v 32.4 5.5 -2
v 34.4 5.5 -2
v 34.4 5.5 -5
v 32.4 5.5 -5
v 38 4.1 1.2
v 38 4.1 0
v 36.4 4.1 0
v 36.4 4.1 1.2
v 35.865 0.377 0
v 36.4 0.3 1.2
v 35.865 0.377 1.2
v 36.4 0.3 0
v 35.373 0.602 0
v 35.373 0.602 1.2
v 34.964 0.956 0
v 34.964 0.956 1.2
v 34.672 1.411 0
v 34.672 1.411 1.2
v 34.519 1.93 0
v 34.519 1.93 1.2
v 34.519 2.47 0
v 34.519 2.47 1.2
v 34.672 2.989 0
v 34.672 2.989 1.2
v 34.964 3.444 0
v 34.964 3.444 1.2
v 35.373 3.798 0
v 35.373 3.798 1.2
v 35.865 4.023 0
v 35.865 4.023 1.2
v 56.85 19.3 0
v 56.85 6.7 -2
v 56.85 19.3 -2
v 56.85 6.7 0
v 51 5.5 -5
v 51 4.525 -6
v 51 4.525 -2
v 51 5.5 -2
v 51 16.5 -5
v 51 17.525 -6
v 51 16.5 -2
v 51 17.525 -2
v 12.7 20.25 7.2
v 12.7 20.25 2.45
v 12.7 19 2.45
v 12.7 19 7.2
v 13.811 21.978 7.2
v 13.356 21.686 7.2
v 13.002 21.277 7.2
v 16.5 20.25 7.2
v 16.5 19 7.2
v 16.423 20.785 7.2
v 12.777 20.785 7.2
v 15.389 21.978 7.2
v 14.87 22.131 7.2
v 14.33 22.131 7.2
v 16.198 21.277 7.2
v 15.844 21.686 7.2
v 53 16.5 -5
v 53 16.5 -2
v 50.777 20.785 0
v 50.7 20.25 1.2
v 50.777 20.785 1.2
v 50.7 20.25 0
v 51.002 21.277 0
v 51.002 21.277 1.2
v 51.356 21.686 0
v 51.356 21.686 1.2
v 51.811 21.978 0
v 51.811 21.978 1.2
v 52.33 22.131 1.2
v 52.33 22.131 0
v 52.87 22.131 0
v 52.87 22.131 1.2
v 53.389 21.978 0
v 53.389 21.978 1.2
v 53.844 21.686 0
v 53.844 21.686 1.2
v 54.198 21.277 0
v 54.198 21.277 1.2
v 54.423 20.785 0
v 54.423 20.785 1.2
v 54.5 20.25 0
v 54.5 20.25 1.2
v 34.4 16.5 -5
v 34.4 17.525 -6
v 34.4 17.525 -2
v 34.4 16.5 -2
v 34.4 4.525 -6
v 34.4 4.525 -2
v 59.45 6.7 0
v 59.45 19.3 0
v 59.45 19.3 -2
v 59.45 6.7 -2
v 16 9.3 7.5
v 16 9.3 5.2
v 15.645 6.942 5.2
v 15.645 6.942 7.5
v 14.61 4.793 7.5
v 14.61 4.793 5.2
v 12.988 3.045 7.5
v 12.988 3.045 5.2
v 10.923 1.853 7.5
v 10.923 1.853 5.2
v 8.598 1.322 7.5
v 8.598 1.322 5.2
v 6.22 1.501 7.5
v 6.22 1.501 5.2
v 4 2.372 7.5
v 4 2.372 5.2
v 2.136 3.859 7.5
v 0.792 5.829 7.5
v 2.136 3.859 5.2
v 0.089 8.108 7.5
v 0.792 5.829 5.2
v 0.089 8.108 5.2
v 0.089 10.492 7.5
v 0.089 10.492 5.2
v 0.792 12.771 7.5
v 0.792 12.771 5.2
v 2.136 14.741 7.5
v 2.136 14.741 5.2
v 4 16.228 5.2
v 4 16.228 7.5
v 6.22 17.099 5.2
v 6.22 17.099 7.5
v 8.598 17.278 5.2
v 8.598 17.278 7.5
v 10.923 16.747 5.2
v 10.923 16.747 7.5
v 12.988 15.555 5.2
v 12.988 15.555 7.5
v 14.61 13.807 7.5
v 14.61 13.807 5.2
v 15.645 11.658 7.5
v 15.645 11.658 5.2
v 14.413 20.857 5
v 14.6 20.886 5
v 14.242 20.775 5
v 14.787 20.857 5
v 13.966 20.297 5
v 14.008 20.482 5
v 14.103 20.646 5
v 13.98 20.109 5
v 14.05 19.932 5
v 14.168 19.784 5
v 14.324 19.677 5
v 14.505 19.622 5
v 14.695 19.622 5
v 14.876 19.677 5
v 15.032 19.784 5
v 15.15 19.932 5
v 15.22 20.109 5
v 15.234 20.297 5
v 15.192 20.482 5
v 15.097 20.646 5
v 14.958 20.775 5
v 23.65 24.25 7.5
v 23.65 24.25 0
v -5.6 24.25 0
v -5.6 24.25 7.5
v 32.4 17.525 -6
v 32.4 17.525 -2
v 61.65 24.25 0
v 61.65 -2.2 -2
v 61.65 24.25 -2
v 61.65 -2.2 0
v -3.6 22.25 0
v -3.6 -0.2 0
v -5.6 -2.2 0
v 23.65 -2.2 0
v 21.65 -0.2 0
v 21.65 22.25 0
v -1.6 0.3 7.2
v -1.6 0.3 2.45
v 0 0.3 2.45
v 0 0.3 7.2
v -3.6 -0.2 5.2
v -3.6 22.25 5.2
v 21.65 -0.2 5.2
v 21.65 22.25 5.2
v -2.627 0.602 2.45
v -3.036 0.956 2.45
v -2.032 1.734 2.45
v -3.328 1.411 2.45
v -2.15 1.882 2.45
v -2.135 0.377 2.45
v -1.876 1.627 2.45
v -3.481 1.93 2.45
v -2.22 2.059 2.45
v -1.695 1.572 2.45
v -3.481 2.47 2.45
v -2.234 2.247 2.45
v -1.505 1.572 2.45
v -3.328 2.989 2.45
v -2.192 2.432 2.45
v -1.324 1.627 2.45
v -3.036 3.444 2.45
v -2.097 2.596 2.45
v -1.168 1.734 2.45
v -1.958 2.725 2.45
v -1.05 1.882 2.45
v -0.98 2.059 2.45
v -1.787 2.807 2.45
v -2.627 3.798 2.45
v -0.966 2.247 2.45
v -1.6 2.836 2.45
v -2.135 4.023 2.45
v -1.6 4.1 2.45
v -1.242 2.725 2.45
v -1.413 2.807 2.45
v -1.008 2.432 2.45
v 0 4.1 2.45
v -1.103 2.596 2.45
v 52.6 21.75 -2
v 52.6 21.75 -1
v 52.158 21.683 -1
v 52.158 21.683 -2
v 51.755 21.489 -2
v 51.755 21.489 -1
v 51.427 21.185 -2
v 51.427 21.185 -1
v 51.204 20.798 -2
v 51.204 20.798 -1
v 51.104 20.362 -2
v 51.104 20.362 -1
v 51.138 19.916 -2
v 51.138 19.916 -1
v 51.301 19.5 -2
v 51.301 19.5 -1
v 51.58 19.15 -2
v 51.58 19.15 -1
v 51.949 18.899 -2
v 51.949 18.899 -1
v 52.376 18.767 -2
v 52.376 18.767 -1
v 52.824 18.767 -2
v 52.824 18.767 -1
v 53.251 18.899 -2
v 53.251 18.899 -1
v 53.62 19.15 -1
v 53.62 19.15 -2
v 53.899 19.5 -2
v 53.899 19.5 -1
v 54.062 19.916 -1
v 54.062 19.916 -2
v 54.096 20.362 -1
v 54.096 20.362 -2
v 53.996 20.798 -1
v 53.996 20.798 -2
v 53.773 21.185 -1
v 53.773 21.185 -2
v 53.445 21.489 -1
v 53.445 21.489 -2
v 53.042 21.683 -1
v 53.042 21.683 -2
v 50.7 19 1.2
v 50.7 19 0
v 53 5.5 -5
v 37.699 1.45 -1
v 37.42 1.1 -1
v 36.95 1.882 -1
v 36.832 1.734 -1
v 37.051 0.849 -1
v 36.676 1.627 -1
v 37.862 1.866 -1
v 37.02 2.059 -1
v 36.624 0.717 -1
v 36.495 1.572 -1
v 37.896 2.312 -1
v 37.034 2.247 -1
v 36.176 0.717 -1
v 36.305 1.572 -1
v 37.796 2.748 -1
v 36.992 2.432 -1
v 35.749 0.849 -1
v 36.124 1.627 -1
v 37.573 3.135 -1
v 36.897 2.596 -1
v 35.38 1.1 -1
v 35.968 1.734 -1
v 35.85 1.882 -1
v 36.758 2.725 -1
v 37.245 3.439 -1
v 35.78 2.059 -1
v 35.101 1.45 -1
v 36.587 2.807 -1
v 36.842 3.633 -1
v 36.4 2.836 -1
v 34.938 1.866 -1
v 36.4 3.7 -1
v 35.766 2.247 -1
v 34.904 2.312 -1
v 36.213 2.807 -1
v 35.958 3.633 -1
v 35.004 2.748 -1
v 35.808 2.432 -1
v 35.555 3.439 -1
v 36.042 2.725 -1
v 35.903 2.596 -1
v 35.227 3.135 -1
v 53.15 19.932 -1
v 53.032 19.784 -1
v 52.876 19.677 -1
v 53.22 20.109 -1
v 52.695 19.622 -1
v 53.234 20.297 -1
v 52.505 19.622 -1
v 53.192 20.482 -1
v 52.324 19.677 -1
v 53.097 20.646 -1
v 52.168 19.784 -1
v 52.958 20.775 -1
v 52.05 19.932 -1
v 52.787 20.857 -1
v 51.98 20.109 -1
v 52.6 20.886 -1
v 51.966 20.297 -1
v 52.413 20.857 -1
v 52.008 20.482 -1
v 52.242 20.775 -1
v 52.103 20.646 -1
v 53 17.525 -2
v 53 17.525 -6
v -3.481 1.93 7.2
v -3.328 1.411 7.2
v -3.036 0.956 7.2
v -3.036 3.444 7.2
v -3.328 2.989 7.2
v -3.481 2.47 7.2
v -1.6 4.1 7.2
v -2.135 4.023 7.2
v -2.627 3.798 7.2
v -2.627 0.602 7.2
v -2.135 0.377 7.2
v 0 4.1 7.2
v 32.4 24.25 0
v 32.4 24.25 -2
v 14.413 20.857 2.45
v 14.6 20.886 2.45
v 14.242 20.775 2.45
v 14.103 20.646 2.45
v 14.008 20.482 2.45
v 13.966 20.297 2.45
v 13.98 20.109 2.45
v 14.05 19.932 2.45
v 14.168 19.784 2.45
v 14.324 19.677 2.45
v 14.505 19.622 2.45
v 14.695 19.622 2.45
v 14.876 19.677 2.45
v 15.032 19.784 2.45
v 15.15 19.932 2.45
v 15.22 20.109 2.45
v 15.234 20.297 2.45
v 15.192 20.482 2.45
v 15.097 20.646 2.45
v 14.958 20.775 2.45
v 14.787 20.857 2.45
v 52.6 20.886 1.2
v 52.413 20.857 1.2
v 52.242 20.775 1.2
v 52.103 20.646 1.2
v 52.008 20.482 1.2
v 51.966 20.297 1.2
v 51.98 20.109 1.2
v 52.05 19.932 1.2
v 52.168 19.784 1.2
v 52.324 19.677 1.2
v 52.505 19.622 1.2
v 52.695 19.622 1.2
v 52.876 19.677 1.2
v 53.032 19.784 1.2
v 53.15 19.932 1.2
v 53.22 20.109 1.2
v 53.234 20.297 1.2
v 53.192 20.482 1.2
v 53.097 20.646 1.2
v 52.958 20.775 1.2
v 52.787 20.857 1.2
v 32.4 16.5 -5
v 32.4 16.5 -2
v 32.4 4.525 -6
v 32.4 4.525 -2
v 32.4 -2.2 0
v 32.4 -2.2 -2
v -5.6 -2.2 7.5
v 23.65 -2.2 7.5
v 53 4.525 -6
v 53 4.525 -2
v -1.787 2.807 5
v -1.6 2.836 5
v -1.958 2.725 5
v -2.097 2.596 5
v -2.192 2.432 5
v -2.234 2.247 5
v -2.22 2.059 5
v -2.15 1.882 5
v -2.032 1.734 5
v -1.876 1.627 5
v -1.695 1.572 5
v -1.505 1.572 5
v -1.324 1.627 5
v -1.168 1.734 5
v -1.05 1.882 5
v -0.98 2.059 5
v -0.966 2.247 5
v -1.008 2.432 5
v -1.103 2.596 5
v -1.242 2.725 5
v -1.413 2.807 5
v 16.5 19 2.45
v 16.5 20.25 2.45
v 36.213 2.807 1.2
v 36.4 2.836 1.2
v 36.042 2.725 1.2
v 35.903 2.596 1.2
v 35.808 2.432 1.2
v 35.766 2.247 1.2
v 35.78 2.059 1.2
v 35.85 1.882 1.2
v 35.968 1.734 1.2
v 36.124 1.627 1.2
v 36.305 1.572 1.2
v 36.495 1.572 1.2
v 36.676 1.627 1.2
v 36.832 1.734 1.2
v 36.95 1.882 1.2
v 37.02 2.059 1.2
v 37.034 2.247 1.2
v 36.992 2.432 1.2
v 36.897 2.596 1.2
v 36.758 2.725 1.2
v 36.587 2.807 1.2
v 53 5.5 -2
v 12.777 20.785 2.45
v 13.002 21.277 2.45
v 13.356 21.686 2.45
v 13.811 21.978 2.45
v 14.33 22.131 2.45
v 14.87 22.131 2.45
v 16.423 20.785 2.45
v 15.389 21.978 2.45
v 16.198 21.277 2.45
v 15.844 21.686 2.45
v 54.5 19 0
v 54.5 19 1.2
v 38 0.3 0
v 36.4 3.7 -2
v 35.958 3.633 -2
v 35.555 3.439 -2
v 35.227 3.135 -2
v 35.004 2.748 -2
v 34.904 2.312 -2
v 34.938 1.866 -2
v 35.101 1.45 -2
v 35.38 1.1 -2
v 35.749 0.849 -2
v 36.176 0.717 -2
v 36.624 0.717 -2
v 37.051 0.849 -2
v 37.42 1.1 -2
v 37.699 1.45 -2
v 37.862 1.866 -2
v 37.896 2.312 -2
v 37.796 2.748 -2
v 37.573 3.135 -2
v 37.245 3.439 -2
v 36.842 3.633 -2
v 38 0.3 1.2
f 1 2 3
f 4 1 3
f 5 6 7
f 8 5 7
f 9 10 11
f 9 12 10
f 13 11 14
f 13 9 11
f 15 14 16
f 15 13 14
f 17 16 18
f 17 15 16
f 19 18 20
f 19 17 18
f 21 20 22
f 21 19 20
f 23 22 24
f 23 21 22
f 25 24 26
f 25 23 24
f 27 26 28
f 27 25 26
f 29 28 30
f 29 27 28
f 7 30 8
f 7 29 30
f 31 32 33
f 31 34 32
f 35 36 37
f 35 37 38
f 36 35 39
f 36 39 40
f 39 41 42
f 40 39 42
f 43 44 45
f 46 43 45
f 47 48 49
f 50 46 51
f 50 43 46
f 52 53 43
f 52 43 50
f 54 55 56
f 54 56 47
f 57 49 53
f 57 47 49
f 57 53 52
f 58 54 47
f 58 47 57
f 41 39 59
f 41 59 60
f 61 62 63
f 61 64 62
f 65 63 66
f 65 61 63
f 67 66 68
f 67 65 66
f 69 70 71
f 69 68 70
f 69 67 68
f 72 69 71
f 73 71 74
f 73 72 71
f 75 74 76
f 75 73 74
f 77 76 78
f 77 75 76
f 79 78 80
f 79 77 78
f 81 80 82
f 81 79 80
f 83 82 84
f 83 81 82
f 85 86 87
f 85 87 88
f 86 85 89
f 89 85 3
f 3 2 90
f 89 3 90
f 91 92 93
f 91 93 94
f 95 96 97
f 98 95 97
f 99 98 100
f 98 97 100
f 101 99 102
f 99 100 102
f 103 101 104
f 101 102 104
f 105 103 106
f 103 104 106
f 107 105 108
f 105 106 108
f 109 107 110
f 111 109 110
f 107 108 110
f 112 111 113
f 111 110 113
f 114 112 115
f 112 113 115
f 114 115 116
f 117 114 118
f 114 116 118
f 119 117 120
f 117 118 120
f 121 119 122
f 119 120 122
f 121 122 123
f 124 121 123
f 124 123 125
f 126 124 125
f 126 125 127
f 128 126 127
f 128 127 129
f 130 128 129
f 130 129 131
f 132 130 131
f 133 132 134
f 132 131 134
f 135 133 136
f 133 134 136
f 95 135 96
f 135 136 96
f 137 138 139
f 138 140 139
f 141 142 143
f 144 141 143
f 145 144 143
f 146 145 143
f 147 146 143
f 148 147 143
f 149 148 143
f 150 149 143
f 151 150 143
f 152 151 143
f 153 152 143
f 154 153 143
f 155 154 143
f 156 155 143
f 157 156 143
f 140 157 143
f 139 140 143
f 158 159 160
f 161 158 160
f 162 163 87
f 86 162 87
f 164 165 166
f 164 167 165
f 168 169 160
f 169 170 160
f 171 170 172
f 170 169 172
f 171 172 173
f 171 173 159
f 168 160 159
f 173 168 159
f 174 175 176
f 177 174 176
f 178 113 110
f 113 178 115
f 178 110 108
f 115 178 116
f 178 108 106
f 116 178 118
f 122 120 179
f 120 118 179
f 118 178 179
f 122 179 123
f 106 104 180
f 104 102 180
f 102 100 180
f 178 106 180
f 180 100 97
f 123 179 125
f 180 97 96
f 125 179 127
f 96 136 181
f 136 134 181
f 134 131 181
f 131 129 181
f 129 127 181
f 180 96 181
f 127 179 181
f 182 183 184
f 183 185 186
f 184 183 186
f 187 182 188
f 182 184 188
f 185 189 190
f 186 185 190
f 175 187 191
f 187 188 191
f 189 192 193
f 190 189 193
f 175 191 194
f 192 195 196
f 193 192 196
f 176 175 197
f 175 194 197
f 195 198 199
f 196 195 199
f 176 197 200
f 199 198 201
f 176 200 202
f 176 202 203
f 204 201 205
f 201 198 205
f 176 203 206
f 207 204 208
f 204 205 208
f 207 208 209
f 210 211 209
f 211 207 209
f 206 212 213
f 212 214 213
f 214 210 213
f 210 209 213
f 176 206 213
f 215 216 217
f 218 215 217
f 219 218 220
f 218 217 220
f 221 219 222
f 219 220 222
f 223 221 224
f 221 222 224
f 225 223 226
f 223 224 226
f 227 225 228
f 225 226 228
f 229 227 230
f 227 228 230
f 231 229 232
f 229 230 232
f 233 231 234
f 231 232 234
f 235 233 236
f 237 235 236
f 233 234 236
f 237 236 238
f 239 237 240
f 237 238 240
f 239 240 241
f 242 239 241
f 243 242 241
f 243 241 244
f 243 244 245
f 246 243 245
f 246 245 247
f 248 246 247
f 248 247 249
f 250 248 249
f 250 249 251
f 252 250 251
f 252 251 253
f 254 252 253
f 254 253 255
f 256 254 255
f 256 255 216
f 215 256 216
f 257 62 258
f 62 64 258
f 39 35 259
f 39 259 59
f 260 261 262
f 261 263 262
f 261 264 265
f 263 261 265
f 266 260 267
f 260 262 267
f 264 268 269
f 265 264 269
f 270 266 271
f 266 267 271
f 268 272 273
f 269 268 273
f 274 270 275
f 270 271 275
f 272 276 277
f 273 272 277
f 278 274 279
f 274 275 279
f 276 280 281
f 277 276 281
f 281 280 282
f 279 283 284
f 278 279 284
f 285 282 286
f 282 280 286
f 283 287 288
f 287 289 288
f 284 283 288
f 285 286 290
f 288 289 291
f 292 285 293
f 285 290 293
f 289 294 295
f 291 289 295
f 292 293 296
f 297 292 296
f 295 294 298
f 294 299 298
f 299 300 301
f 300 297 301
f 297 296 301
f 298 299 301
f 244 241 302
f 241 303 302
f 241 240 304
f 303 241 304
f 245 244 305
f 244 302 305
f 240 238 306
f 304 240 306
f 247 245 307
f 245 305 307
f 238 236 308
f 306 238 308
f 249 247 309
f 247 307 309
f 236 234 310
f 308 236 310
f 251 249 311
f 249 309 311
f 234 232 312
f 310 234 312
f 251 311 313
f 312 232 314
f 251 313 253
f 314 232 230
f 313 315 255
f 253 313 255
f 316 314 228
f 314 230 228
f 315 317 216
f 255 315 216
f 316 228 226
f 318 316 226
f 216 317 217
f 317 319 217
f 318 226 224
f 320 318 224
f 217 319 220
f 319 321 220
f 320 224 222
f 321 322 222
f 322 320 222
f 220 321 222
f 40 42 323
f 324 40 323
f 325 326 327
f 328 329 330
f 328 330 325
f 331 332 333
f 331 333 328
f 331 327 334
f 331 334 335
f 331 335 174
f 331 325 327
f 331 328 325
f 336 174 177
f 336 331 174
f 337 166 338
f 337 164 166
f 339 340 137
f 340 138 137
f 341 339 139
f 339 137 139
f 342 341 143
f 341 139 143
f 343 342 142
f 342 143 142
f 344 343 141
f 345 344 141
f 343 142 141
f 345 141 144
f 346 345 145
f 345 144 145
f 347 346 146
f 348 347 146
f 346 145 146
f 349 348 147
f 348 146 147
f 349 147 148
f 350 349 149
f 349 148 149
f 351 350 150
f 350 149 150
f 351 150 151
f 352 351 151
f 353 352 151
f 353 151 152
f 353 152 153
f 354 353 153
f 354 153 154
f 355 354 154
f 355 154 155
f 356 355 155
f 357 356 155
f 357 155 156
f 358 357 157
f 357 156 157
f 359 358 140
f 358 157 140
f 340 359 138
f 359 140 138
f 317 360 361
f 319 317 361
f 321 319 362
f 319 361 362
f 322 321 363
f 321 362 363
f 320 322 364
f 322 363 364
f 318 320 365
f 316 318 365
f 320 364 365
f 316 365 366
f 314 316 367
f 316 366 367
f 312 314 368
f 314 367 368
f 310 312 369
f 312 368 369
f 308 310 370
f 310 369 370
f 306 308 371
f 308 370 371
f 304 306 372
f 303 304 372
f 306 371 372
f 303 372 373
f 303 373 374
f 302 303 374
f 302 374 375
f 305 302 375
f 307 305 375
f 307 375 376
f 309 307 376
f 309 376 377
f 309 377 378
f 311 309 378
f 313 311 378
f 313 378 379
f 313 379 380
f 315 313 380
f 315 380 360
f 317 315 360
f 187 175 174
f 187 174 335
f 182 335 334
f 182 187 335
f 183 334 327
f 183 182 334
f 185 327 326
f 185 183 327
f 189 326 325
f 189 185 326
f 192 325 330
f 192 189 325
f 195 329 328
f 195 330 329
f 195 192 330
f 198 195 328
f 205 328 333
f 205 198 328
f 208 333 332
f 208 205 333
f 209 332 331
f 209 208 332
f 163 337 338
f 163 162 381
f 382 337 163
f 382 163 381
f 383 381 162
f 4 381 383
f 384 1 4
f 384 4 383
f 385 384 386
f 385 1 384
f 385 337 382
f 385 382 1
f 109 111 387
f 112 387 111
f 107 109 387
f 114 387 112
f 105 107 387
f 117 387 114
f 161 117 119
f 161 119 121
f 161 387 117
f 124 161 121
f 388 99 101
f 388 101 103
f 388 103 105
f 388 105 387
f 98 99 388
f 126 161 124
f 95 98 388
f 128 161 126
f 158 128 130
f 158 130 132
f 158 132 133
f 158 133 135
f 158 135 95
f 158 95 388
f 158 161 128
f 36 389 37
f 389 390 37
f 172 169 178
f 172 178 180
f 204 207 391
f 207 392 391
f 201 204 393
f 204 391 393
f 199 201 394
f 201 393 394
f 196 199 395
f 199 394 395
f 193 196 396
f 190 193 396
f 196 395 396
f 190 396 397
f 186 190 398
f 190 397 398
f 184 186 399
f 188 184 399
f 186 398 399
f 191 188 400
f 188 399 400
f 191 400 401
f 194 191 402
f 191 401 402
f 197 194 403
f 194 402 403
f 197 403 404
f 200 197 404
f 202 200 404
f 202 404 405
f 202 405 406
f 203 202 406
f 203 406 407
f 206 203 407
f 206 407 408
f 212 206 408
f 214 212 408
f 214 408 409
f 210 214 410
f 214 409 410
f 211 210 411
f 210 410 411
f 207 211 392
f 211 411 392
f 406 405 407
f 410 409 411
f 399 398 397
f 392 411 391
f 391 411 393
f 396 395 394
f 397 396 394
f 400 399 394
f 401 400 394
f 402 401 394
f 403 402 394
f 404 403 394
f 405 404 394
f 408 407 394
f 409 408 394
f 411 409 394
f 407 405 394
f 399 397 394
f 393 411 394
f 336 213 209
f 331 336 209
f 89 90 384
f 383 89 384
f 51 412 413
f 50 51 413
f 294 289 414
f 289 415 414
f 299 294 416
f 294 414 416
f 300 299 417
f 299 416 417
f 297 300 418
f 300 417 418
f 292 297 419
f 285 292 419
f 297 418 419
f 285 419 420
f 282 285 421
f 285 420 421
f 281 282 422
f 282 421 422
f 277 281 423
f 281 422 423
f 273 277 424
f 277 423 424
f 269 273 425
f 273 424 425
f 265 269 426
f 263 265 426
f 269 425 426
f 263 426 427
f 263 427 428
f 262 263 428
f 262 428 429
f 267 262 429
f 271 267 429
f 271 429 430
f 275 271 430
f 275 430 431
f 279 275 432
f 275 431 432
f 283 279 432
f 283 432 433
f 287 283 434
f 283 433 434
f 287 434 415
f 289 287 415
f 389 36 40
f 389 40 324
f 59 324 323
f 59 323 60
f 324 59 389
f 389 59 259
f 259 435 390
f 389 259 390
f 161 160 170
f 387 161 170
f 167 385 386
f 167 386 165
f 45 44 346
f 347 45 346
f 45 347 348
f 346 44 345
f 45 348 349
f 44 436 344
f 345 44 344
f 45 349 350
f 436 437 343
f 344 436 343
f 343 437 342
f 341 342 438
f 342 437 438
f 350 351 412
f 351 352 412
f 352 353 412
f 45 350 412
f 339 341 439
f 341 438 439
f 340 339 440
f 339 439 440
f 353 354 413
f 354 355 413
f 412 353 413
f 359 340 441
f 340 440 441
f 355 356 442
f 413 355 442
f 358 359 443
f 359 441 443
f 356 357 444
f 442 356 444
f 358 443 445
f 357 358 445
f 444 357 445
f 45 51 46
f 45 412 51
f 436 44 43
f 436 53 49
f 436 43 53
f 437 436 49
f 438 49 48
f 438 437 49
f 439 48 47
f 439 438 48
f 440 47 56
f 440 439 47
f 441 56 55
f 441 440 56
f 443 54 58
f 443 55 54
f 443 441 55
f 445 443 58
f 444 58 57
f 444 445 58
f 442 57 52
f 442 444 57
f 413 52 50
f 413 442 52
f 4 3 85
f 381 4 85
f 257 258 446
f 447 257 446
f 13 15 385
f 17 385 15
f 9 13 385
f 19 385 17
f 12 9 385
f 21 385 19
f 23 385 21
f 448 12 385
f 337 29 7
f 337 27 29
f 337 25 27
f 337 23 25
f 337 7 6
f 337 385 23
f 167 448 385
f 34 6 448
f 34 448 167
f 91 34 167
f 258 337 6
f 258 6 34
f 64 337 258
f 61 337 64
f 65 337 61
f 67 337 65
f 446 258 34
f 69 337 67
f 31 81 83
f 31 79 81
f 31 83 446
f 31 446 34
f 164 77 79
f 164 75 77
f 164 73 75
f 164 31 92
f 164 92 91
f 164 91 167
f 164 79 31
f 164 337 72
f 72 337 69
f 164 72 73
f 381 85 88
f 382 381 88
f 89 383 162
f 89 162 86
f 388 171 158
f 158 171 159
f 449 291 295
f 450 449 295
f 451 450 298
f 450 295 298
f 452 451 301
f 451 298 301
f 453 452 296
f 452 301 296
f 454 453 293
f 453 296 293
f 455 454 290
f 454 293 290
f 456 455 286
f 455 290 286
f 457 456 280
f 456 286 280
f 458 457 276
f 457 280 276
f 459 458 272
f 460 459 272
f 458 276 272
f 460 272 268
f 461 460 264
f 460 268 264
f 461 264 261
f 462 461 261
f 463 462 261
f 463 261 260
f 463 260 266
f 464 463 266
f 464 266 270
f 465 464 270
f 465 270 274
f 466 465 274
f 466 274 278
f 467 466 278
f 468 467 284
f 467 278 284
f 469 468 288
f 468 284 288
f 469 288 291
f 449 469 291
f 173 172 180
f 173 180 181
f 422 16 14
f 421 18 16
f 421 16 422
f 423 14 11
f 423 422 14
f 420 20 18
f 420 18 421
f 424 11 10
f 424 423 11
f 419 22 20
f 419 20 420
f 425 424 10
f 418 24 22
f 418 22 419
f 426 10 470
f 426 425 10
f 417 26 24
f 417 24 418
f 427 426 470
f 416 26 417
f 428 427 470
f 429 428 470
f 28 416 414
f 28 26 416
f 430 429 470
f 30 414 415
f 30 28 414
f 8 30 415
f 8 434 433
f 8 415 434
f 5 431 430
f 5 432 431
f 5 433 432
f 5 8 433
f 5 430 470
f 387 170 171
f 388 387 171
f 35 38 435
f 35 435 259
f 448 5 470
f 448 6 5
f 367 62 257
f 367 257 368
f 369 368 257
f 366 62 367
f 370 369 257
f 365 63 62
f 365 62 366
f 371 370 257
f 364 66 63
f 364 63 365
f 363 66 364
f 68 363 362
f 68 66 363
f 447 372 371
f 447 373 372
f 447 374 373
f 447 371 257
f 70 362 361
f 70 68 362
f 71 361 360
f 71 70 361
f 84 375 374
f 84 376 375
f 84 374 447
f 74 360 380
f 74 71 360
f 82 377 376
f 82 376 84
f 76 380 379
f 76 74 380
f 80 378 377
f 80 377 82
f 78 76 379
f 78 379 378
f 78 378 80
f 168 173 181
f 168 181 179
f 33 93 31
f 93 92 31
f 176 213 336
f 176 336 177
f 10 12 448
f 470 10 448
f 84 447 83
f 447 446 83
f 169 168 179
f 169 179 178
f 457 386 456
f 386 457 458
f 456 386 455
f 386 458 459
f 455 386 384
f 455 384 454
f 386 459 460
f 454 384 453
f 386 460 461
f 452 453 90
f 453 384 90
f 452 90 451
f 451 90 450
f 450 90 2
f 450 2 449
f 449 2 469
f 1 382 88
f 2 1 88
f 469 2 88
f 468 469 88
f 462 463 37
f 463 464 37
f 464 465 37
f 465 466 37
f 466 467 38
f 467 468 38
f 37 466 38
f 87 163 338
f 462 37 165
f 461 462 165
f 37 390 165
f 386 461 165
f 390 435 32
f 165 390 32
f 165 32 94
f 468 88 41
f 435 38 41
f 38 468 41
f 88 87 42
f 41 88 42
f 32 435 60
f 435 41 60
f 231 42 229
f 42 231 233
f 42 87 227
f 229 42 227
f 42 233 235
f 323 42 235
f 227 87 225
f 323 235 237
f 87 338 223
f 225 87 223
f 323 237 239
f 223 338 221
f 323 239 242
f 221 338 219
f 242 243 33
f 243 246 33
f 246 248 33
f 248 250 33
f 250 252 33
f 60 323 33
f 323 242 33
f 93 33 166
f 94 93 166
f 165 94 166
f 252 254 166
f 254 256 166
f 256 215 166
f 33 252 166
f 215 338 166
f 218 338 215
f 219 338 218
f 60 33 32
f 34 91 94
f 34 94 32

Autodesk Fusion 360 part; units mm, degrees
sketch "Sketch3" plane through (0, 0, 0) normal (0, 0, 1) x (1, 0, 0)
  line L0 (0, 0) -> (16.95, 0)
  line L1 (16.95, 0) -> (16.95, 19)
  line L2 (16.95, 19) -> (0, 19)
  line L3 (0, 19) -> (0, 0)
  circle A0 centre (8, 9.3) radius 8
  circle A1 centre (14.6, 20.25) radius 0.8
  circle A2 centre (14.6, 20.25) radius 1.9
  line L4 (16.5, 20.25) -> (12.7, 20.25)
  line L5 (12.7, 20.25) -> (12.7, 19)
  line L6 (12.7, 19) -> (16.5, 19)
  line L7 (16.5, 19) -> (16.5, 20.25)
  circle A3 centre (-1.6, 2.2) radius 0.725
  circle A4 centre (-1.6, 2.2) radius 1.9
  line L8 (0, 4.1) -> (0, 0)
  line L9 (-1.6, 0.3) -> (0, 0.3)
  line L10 (0, 0.3) -> (0, 4.1)
  line L11 (0, 4.1) -> (-1.6, 4.1)
  line L12 (-1.6, 4.1) -> (-1.6, 0.3)
  line L13 (21.45, 19.3) -> (18.85, 19.3)
  line L14 (18.85, 19.3) -> (18.85, 16.7)
  line L15 (18.85, 16.7) -> (21.45, 16.7)
  line L16 (21.45, 16.7) -> (21.45, 19.3)
  line L17 (21.45, 19.3) -> (18.85, 16.7) construction
  line L18 (18.85, 19.3) -> (21.45, 16.7) construction
  line L19 (18.85, 19.3) -> (21.45, 19.3)
  line L20 (21.45, 19.3) -> (21.45, 6.7)
  line L21 (21.45, 6.7) -> (18.85, 6.7)
  line L22 (18.85, 6.7) -> (18.85, 19.3)
  circle A5 centre (52.6, 20.25) radius 1.9
  line L23 (38, 4.1) -> (38, 0)
  line L24 (59.45, 6.7) -> (56.85, 6.7)
  line L25 (50.7, 19) -> (54.5, 19)
  line L26 (59.45, 19.3) -> (56.85, 19.3)
  circle A6 centre (36.4, 2.2) radius 0.725
  line L27 (36.4, 0.3) -> (38, 0.3)
  line L28 (54.5, 19) -> (54.5, 20.25)
  line L29 (56.85, 19.3) -> (59.45, 19.3)
  line L30 (56.85, 6.7) -> (56.85, 19.3)
  line L31 (38, 0.3) -> (38, 4.1)
  circle A7 centre (52.6, 20.25) radius 0.8
  line L32 (36.4, 4.1) -> (36.4, 0.3)
  line L33 (54.95, 0) -> (54.95, 19)
  line L34 (56.85, 19.3) -> (56.85, 16.7)
  line L35 (59.45, 19.3) -> (59.45, 6.7)
  line L36 (59.45, 19.3) -> (56.85, 16.7) construction
  line L37 (54.95, 19) -> (38, 19)
  circle A8 centre (36.4, 2.2) radius 1.9
  line L38 (38, 4.1) -> (36.4, 4.1)
  line L39 (56.85, 19.3) -> (59.45, 16.7) construction
  line L40 (54.5, 20.25) -> (50.7, 20.25)
  line L41 (56.85, 16.7) -> (59.45, 16.7)
  line L42 (38, 0) -> (54.95, 0)
  line L43 (59.45, 16.7) -> (59.45, 19.3)
  circle A9 centre (46, 9.3) radius 8
  line L44 (50.7, 20.25) -> (50.7, 19)
  line L45 (38, 19) -> (38, 0)
  point P0 (8, 9.3)
  point P1 (14.6, 20.25)
  point P2 (-1.6, 2.2)
  point P3 (20.15, 18)
  point P4 (20.15, 18)
  point P5 (38, 0)
  point P6 (52.6, 20.25)
  point P7 (46, 9.3)
  point P8 (36.4, 2.2)
  point P9 (58.15, 18)
  point P10 (58.15, 18)
  dimension "d8" = 16.95
  dimension "d9" = 19
  dimension "d10" = 9.3
  dimension "d11" = 8
  dimension "d12" = 16
  dimension "d13" = 10.95
  dimension "d14" = 14.6
  dimension "d15" = 1.6
  dimension "d16" = 3.8
  dimension "d17" = 7.1
  dimension "d18" = 16.2
  dimension "d19" = 1.45
  dimension "d20" = 3.8
  dimension "d21" = 5.55
  dimension "d22" = 2.25
  dimension "d23" = 2.6
  dimension "d24" = 2.6
  dimension "d25" = 2.6
  dimension "d26" = 12.6
  dimension "d40" = 16.95
  dimension "d41" = 19
  dimension "d42" = 9.3
  dimension "d43" = 8
  dimension "d44" = 16
  dimension "d45" = 10.95
  dimension "d46" = 14.6
  dimension "d47" = 1.6
  dimension "d48" = 3.8
  dimension "d49" = 7.1
  dimension "d50" = 16.2
  dimension "d51" = 1.45
  dimension "d52" = 3.8
  dimension "d53" = 5.55
  dimension "d54" = 2.25
  dimension "d55" = 2.6
  dimension "d56" = 2.6
  dimension "d57" = 2.6
  dimension "d58" = 12.6
sketch "Sketch5" plane through (0, 0, 0) normal (0, 0, 1) x (1, 0, 0)
  line L0 (21.65, 22.25) -> (-3.6, 22.25)
  line L1 (-3.6, 22.25) -> (-3.6, -0.2)
  line L2 (-3.6, -0.2) -> (21.65, -0.2)
  line L3 (21.65, -0.2) -> (21.65, 22.25)
  line L4 (21.45, 19.3) -> (21.45, 6.7)
  line L5 (0, 0) -> (16.95, 0)
  line L6 (-5.6, -2.2) -> (23.65, -2.2)
  line L7 (23.65, -2.2) -> (23.65, 24.25)
  line L8 (23.65, 24.25) -> (-5.6, 24.25)
  line L9 (-5.6, 24.25) -> (-5.6, -2.2)
  line L10 (61.65, 24.25) -> (32.4, 24.25)
  line L11 (34.4, -0.2) -> (59.65, -0.2)
  line L12 (38, 0) -> (54.95, 0)
  line L13 (32.4, 24.25) -> (32.4, -2.2)
  line L14 (32.4, -2.2) -> (61.65, -2.2)
  line L15 (61.65, -2.2) -> (61.65, 24.25)
  line L16 (59.65, 22.25) -> (34.4, 22.25)
  line L17 (34.4, 22.25) -> (34.4, -0.2)
  line L18 (59.45, 19.3) -> (59.45, 6.7)
  line L19 (59.65, -0.2) -> (59.65, 22.25)
  point P0 (-1.6, 2.2)
  point P1 (14.6, 20.25)
  point P2 (38, 0)
  point P3 (36.4, 2.2)
  point P4 (52.6, 20.25)
  dimension "d28" = 2
  dimension "d29" = 2
  dimension "d30" = 0.2
  dimension "d31" = 0.2
  dimension "d32" = 2
  dimension "d33" = 2
  dimension "d34" = 2
  dimension "d35" = 2
  dimension "d69" = 2
  dimension "d70" = 2
  dimension "d71" = 0.2
  dimension "d72" = 0.2
  dimension "d73" = 2
  dimension "d74" = 2
  dimension "d75" = 2
  dimension "d76" = 2
extrude "Extrude3" add sketch "Sketch5" along normal blind 7.5 contours L0 L1 L2 L3 | L6 L7 L8 L9 makes body 1
extrude "Extrude4" cut sketch "Sketch5" along normal blind 5.2 contours L0 L1 L2 L3 bodies 1
extrude "Extrude5" cut sketch "Sketch3" along normal blind 8 contours A0 bodies 1
extrude "Extrude6" add sketch "Sketch3" along normal blind 7.2 separate body contours L3 A4 L8 L9 L10 | L3 A3 A4 L8 L10 L12 | A3 A4 L12 | L2 A2 L6 L7 | L3 A4 L8 L10 L11 | A3 L12 | A3 L12 | L2 A1 A2 L4 L6 | A1 A2 L4 | L2 A2 L5 L6 | A1 L4 | A1 L4 makes body 2 at (-1.6947, 0.3024, 4.8) makes body 3 at (12.7094, 20.4392, 2.4)
extrude "Extrude7" cut sketch "Sketch3" along normal blind 2.45 contours L3 A4 L8 L9 L10 | L3 A3 A4 L8 L10 L12 | A3 A4 L12 | L2 A2 L6 L7 | L3 A4 L8 L10 L11 | A3 L12 | A3 L12 | L2 A1 A2 L4 L6 | A1 A2 L4 | L2 A2 L5 L6 | A1 L4 | A1 L4 bodies 2 3
extrude "Extrude8" add sketch "Sketch3" sketch "Sketch5" against normal blind 2 separate body contours A5 A7 L40 | A5 L25 L28 L37 | A5 L25 A7 L37 L40 | A5 L25 L37 L44 | A9 | A5 L23 L25 L31 L33 L37 A8 L42 L45 | A5 L25 L37 | A7 L40 | A7 L40 | L23 L31 A8 L38 L45 | L23 L27 L31 A8 L45 | L23 L31 A8 L45 | L23 A6 L31 L32 A8 L45 | A6 L32 A8 | A6 L32 | A6 L32 | L24 L30 L35 L41 | L26 L29 L30 L34 L35 L41 L43 of sketch 2 contours L10 L13 L14 L15 | L11 L16 L17 L19 makes body 4
extrude "Extrude9" cut sketch "Sketch3" against normal blind 2 contours L24 L30 L35 L41 | L26 L29 L30 L34 L35 L41 L43 bodies 4
extrude "Extrude10" add sketch "Sketch3" along normal blind 1.2 contours A5 A7 L40 | A5 L25 L28 L37 | A5 L25 A7 L37 L40 | A5 L25 L37 L44 | A7 L40 | A7 L40 | L23 L31 A8 L38 L45 | L23 L27 L31 A8 L45 | L23 A6 L31 L32 A8 L45 | A6 L32 A8 | A6 L32 | A6 L32 bodies 4
sketch "Sketch9" plane through (0, 0, -2) normal (0, 0, -1) x (1, 0, 0)
  line L0 (59.45, -19.3) -> (56.85, -19.3)
  line L1 (56.85, -19.3) -> (56.85, -6.7)
  line L2 (56.85, -6.7) -> (59.45, -6.7)
  line L3 (59.45, -6.7) -> (59.45, -19.3)
  line L4 (61.65, -24.25) -> (61.65, 2.2)
  line L5 (61.65, 2.2) -> (32.4, 2.2)
  line L6 (32.4, 2.2) -> (32.4, -24.25)
  line L7 (32.4, -24.25) -> (61.65, -24.25)
  line L8 (54.95, 0) -> (54.95, -19)
  circle A0 centre (52.6, -20.25) radius 0.8
  line L9 (21.45, -6.7) -> (18.85, -6.7)
  line L10 (-1.6, -0.3) -> (0, -0.3)
  circle A1 centre (36.4, -2.2) radius 0.725
  line L11 (50.7, -20.25) -> (50.7, -19)
  line L12 (59.45, -16.7) -> (59.45, -19.3)
  line L13 (18.85, -19.3) -> (21.45, -16.7) construction
  line L14 (56.85, -19.3) -> (59.45, -19.3)
  line L15 (21.45, -19.3) -> (21.45, -6.7)
  line L16 (56.85, -19.3) -> (59.45, -16.7) construction
  line L17 (0, -0.3) -> (0, -4.1)
  line L18 (16.95, -19) -> (0, -19)
  line L19 (12.7, -19) -> (16.5, -19)
  circle A2 centre (36.4, -2.2) radius 1.9
  line L20 (0, -19) -> (0, 0)
  line L21 (36.4, -4.1) -> (36.4, -0.3)
  line L22 (38, 0) -> (54.95, 0)
  line L23 (36.4, -0.3) -> (38, -0.3)
  circle A3 centre (-1.6, -2.2) radius 1.9
  line L24 (12.7, -20.25) -> (12.7, -19)
  line L25 (38, -19) -> (38, 0)
  line L26 (18.85, -19.3) -> (18.85, -16.7)
  line L27 (0, 0) -> (16.95, 0)
  line L28 (18.85, -6.7) -> (18.85, -19.3)
  line L29 (59.45, -6.7) -> (56.85, -6.7)
  line L30 (21.45, -16.7) -> (21.45, -19.3)
  circle A4 centre (8, -9.3) radius 8
  line L31 (56.85, -19.3) -> (56.85, -16.7)
  circle A5 centre (52.6, -20.25) radius 1.9
  line L32 (56.85, -6.7) -> (56.85, -19.3)
  line L33 (18.85, -16.7) -> (21.45, -16.7)
  line L34 (0, -4.1) -> (-1.6, -4.1)
  line L35 (18.85, -19.3) -> (21.45, -19.3)
  circle A6 centre (46, -9.3) radius 8
  line L36 (54.5, -20.25) -> (50.7, -20.25)
  line L37 (0, -4.1) -> (0, 0)
  circle A7 centre (14.6, -20.25) radius 1.9
  line L38 (59.45, -19.3) -> (59.45, -6.7)
  line L39 (38, -4.1) -> (36.4, -4.1)
  line L40 (38, -0.3) -> (38, -4.1)
  line L41 (16.5, -19) -> (16.5, -20.25)
  line L42 (50.7, -19) -> (54.5, -19)
  line L43 (38, -4.1) -> (38, 0)
  line L44 (21.45, -19.3) -> (18.85, -16.7) construction
  line L45 (16.5, -20.25) -> (12.7, -20.25)
  line L46 (21.45, -19.3) -> (18.85, -19.3)
  line L47 (56.85, -16.7) -> (59.45, -16.7)
  line L48 (-1.6, -4.1) -> (-1.6, -0.3)
  line L49 (54.5, -19) -> (54.5, -20.25)
  line L50 (54.95, -19) -> (38, -19)
  circle A8 centre (-1.6, -2.2) radius 0.725
  line L51 (59.45, -19.3) -> (56.85, -19.3)
  circle A9 centre (14.6, -20.25) radius 0.8
  line L52 (16.95, 0) -> (16.95, -19)
  line L53 (59.45, -19.3) -> (56.85, -16.7) construction
  point P0 (14.6, -20.25)
  point P1 (20.15, -18)
  point P2 (8, -9.3)
  point P3 (38, 0)
  point P4 (20.15, -18)
  point P5 (58.15, -18)
  point P6 (52.6, -20.25)
  point P7 (46, -9.3)
  point P8 (36.4, -2.2)
  point P9 (-1.6, -2.2)
  point P10 (58.15, -18)
  dimension "d85" = 16.95
  dimension "d86" = 19
  dimension "d87" = 9.3
  dimension "d88" = 8
  dimension "d89" = 16
  dimension "d91" = 14.6
  dimension "d92" = 1.6
  dimension "d93" = 3.8
  dimension "d96" = 1.45
  dimension "d97" = 3.8
  dimension "d100" = 2.6
  dimension "d101" = 2.6
  dimension "d102" = 2.6
  dimension "d103" = 12.6
  dimension "d104" = 16.95
  dimension "d105" = 19
  dimension "d106" = 9.3
  dimension "d107" = 8
  dimension "d108" = 16
  dimension "d110" = 14.6
  dimension "d111" = 1.6
  dimension "d112" = 3.8
  dimension "d115" = 1.45
  dimension "d116" = 3.8
  dimension "d119" = 2.6
  dimension "d120" = 2.6
  dimension "d121" = 2.6
  dimension "d122" = 12.6
hole "Hole1" at (52.6, 20.25, -2) at (36.4, 2.2, -2) at (14.6, 20.25, -2) at (-1.6, 2.2, -2) direction (0, 0, 1) diameter 1.271 depth 7 tip angle 180 counterbore diameter 3 counterbore depth 1 bodies 2 3 4
sketch "Sketch10" plane through (0, 0, -2) normal (0, 0, -1) x (1, 0, 0)
  circle A0 centre (52.6, -20.25) radius 1.5
  circle A1 centre (36.4, -2.2) radius 1.5
  line L0 (59.45, -19.3) -> (56.85, -19.3)
  line L1 (56.85, -19.3) -> (56.85, -6.7)
  line L2 (56.85, -6.7) -> (59.45, -6.7)
  line L3 (59.45, -6.7) -> (59.45, -19.3)
  line L4 (61.65, -24.25) -> (61.65, 2.2)
  line L5 (61.65, 2.2) -> (32.4, 2.2)
  line L6 (32.4, 2.2) -> (32.4, -24.25)
  line L7 (32.4, -24.25) -> (61.65, -24.25)
  line L8 (34.4, -4.525) -> (32.4, -4.525)
  line L9 (32.4, -4.525) -> (32.4, -17.525)
  line L10 (32.4, -17.525) -> (34.4, -17.525)
  line L11 (34.4, -17.525) -> (34.4, -4.525)
  line L12 (34.4, -4.525) -> (32.4, -17.525) construction
  line L13 (32.4, -4.525) -> (34.4, -17.525) construction
  line L14 (51, -17.525) -> (53, -17.525)
  line L15 (53, -17.525) -> (53, -4.525)
  line L16 (53, -4.525) -> (51, -4.525)
  line L17 (51, -4.525) -> (51, -17.525)
  line L18 (51, -17.525) -> (53, -4.525) construction
  line L19 (53, -17.525) -> (51, -4.525) construction
  point P0 (33.4, -11.025)
  point P1 (52, -11.025)
  dimension "d130" = 2
  dimension "d131" = 13
  dimension "d132" = 2
  dimension "d133" = 13
extrude "Extrude11" add sketch "Sketch10" along normal blind 4 contours L6 L8 L9 L10 L11 | L14 L15 L16 L17 bodies 4
sketch "Sketch11" plane through (34.4, 0, 0) normal (1, 0, 0) x (0, 1, 0)
  line L0 (17.525, -2) -> (4.525, -2)
  line L1 (4.525, -2) -> (4.525, -6)
  line L2 (4.525, -6) -> (17.525, -6)
  line L3 (17.525, -6) -> (17.525, -2)
  line L4 (16.5, -2) -> (5.5, -2)
  line L5 (5.5, -2) -> (5.5, -5)
  line L6 (5.5, -5) -> (16.5, -5)
  line L7 (16.5, -5) -> (16.5, -2)
  dimension "d136" = 11
extrude "Extrude12" cut sketch "Sketch11" against normal blind 2 contours L0 L4 L5 L6 L7 bodies 4
extrude "Extrude13" cut sketch "Sketch11" along normal blind 19 contours L0 L4 L5 L6 L7 bodies 4
